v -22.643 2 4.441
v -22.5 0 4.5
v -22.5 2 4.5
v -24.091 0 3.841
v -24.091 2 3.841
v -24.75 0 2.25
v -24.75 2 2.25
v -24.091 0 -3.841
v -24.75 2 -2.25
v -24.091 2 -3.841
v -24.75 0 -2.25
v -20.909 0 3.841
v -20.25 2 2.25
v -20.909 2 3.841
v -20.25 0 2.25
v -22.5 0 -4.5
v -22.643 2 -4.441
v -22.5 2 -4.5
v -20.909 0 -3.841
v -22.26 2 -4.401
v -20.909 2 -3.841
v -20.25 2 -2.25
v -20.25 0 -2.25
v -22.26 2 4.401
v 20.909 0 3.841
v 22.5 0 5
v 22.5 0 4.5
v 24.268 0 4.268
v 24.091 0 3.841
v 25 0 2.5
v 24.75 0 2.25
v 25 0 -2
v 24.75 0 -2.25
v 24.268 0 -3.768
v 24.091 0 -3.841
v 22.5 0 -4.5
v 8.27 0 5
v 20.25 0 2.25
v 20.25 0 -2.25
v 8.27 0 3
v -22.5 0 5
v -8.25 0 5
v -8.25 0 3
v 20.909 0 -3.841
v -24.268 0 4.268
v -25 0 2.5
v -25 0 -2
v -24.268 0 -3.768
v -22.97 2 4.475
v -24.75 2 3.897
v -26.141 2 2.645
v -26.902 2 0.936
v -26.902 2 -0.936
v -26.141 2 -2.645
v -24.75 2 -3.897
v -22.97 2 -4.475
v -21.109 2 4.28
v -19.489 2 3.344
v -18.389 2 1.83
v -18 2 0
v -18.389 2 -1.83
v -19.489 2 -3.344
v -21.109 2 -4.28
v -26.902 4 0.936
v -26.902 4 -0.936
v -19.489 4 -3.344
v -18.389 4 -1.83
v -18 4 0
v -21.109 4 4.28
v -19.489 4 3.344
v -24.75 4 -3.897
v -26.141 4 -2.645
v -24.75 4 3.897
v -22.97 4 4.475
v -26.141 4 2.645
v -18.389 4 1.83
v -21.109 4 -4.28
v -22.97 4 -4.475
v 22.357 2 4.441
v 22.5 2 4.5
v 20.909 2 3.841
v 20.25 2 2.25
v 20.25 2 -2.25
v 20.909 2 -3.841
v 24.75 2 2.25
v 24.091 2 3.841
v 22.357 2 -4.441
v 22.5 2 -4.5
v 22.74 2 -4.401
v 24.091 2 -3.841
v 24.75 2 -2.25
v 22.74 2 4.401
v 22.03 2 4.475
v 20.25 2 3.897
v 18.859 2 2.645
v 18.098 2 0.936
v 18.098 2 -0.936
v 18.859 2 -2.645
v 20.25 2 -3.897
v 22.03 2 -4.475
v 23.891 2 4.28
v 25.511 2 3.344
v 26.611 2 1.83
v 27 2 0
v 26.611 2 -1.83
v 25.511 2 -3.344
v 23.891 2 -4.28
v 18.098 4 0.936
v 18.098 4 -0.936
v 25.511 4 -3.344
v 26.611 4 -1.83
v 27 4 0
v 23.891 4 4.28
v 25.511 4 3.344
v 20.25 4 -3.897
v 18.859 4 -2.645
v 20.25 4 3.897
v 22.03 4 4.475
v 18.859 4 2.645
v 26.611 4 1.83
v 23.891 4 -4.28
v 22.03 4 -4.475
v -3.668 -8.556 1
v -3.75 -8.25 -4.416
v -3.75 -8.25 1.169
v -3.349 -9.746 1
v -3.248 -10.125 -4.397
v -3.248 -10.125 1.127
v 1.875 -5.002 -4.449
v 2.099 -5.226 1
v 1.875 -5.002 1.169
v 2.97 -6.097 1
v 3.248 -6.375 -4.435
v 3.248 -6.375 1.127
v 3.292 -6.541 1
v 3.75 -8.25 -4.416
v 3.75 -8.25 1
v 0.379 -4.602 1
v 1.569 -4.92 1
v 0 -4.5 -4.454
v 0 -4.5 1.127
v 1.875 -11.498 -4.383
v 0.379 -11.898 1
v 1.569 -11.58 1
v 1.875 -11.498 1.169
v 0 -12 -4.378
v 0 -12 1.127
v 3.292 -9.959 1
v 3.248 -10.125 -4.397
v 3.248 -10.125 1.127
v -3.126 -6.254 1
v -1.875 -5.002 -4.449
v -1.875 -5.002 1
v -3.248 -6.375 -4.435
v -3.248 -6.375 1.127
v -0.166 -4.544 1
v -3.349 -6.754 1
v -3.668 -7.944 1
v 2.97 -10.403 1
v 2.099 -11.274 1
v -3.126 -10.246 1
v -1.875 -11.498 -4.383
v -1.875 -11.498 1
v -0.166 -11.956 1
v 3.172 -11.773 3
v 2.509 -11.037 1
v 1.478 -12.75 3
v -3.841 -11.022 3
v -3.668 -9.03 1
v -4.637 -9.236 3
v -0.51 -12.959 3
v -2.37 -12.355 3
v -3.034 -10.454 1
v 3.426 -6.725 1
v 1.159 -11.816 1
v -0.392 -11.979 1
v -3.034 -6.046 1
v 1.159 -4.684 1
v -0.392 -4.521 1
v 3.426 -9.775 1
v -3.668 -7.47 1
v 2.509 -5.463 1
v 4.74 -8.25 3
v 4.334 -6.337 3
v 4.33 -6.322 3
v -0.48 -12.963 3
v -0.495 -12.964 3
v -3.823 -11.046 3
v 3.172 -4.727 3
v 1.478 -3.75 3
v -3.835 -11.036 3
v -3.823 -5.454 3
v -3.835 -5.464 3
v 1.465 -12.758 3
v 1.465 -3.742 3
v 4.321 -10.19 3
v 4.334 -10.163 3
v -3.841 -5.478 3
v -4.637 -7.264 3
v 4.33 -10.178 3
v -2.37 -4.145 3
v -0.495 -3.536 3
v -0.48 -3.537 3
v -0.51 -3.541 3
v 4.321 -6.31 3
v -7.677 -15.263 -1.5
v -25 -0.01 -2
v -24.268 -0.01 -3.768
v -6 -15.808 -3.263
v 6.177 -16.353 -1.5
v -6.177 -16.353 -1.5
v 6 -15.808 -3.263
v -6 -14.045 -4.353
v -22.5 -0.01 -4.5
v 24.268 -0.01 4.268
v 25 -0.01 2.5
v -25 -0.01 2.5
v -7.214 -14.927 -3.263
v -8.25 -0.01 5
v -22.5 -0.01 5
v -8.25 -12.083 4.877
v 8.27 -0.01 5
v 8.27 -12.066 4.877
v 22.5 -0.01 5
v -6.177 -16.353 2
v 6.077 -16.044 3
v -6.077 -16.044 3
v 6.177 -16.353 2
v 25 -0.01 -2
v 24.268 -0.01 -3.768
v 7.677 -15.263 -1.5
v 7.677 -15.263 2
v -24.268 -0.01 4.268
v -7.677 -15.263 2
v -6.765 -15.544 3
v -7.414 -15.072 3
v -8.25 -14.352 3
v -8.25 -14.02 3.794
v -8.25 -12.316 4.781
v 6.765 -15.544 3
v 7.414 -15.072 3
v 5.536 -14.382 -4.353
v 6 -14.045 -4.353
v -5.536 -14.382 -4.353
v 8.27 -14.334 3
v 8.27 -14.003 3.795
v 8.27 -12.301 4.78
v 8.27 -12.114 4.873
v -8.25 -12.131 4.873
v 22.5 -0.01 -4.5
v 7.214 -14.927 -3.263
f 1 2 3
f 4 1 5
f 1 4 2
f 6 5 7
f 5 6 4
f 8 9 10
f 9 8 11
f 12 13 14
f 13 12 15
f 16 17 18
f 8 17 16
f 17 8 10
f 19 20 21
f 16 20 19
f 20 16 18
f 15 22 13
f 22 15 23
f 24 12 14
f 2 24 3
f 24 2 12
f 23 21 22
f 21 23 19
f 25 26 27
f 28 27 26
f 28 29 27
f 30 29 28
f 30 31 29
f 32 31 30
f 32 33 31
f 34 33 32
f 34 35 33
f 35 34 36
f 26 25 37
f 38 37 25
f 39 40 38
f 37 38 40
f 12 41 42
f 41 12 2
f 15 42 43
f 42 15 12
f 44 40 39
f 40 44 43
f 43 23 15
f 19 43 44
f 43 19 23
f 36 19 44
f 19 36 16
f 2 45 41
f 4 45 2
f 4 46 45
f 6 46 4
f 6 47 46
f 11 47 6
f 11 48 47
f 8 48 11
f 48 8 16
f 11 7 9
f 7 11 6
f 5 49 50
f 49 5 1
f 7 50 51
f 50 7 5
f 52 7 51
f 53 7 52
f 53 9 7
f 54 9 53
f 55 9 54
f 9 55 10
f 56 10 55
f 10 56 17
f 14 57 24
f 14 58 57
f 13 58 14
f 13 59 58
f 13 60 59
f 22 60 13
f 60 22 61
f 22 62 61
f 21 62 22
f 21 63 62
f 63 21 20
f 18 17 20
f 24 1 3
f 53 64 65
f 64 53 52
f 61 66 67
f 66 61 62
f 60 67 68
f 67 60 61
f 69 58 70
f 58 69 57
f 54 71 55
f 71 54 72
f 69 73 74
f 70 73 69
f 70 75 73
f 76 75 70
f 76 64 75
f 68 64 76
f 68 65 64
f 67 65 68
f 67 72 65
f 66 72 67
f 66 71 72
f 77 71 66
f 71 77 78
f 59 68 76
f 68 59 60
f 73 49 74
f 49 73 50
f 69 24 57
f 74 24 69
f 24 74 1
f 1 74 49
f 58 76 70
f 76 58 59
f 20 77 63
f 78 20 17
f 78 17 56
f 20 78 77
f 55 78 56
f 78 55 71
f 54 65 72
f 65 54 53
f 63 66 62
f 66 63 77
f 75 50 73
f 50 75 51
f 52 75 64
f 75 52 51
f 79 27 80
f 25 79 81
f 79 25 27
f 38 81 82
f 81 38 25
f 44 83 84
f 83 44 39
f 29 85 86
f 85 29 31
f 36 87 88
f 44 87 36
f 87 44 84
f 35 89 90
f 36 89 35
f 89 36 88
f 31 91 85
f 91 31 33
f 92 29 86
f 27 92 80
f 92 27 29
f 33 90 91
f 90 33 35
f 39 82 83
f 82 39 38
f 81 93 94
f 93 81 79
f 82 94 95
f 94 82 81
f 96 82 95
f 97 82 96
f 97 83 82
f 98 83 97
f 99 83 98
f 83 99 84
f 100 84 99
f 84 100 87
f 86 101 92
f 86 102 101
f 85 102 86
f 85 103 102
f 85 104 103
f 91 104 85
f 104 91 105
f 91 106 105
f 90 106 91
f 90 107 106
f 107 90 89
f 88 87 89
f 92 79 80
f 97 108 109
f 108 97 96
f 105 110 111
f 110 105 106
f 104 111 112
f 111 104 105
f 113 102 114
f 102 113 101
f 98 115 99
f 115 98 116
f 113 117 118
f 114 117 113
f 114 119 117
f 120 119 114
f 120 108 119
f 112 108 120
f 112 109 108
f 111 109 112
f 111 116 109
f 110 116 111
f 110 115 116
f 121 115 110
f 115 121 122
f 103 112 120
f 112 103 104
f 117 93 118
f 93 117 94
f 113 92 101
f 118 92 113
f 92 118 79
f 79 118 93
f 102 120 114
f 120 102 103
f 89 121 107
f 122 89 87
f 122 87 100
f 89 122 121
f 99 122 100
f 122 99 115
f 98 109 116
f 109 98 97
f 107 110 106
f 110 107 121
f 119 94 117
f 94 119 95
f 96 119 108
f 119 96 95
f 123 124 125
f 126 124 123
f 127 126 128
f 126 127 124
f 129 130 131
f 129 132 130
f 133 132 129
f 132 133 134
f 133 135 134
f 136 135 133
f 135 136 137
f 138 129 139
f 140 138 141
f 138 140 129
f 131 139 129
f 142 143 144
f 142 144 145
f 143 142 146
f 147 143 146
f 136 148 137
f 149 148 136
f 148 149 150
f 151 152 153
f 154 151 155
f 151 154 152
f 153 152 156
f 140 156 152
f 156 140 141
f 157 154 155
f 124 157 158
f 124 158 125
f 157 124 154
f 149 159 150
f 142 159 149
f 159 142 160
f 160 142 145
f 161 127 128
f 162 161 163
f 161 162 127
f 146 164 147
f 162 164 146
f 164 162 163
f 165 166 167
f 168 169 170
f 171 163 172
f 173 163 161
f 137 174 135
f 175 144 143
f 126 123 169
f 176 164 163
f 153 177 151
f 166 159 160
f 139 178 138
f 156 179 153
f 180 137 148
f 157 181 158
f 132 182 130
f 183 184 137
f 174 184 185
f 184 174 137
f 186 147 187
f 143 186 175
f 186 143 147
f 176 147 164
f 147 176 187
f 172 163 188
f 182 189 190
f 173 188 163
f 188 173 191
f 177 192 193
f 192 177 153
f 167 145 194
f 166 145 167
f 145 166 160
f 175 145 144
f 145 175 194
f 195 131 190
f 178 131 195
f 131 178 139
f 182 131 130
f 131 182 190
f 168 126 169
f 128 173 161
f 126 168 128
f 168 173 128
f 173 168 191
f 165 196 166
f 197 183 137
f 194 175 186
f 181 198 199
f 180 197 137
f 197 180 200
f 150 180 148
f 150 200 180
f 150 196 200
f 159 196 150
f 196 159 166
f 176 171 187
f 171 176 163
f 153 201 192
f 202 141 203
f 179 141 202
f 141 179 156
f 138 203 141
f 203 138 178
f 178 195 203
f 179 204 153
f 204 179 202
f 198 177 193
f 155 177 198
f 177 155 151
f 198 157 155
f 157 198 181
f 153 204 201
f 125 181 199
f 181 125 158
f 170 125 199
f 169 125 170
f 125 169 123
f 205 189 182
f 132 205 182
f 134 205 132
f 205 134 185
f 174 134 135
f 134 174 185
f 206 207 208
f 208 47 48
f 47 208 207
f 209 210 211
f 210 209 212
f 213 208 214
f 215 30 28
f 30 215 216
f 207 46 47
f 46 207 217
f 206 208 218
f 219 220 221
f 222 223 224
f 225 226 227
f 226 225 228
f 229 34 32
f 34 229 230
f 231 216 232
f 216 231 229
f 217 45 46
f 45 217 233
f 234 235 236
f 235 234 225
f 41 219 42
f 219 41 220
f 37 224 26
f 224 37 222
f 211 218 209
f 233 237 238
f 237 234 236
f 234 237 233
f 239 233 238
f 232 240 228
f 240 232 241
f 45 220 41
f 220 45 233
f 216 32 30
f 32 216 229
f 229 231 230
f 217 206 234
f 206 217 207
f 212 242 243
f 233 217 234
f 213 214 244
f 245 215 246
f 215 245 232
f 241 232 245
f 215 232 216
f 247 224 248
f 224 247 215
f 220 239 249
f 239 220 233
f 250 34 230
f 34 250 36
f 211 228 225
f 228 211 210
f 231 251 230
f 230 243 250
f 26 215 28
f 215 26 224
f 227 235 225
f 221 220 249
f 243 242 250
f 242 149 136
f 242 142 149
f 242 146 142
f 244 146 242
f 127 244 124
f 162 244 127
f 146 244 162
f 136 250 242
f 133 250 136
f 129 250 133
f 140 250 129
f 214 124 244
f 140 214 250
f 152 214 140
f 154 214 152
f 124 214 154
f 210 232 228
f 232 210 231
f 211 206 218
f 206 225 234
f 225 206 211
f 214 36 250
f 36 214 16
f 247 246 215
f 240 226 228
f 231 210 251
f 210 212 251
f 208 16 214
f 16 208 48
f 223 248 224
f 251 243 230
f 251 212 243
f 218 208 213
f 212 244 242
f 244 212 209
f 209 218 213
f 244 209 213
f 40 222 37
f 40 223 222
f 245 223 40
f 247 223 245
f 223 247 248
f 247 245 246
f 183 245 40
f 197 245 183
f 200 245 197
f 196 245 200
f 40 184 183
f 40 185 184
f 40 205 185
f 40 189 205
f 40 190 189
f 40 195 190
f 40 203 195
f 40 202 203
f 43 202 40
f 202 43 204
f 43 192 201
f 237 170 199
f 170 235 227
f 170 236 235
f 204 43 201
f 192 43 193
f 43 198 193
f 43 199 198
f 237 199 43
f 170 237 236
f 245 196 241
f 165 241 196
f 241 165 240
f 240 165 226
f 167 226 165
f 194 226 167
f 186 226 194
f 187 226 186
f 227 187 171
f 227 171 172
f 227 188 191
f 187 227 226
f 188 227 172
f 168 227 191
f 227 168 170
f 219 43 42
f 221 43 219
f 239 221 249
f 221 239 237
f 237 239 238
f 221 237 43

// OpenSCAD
// file: peg.scad
pegSlot = 5; // the small opening it slides into
pegD = 9;    // the large opening to put it into
pegH = 22;   // top of large opening to bottom of small opening

holeD = 3.75; // "screw" holes

holeSpacingX = 15;
holeSpacingY = 14.5; // yes, this is actually not a grid. go figure
pegSpacingX = 3 * holeSpacingX;
pegSpacingY = 4 * holeSpacingY;

module peg(t = 2, clearance = 2)
{
    D = pegD;
    d = 4.5;

    rotate([ -90, 0, 0 ])
    {
        hull()
        {
            translate([ 0, (D - d) / 2, 0 ]) cylinder(h = clearance, d = d);
            translate([ 0, -(D - d) / 2, 0 ]) cylinder(h = clearance, d = d);
        }
        translate([ 0, 0, clearance ]) cylinder(h = t, d = D);
    }
}

module pegs(n, t = 2, clearance = 2)
{
    pegSpacingX = 45;
    x0 = ((1 - n) * pegSpacingX) / 2;
    for (i = [0:(n - 1)])
    {
        translate([ x0 + i * pegSpacingX, 0, 0 ]) peg(t, clearance);
    }
}
// main file
include <peg.scad>;

// thick enough to block pivoting, but thin enough so it is enough to push the top endcap up to unblock it
pivotBlocker = (pegD - pegSlot) / 2;

od = 16.5;

pivotD = 7.5;
pivotH = 9;
pivotLip = 2; // extrusion at the edge is a bit wider then the rest

pivotOffset = 226;
height = (4 * pegSpacingY - pivotOffset) / 2 + pivotBlocker;

width = pegSpacingX + pegSlot;
rounding = 3;

endCap();
module endCap()
{
    pegs(2);
    difference()
    {
        hull()
        {
            rotate([ 90, 0, 0 ])
            {
                translate([ pegSlot / 2 - width / 2, pegSlot / 2 - pegD / 2, 0 ]) cylinder(h = .01, d = pegSlot);
                translate([ width / 2 - pegSlot / 2, pegSlot / 2 - pegD / 2, 0 ]) cylinder(h = .01, d = pegSlot);
                translate([ pegSlot / 2 - width / 2, height - pegSlot / 2, 0 ]) cylinder(h = .01, d = pegSlot);
                translate([ width / 2 - pegSlot / 2, height - pegSlot / 2, 0 ]) cylinder(h = .01, d = pegSlot);
            }
            translate([ rounding - od / 2, rounding - od, rounding - pegD / 2 ]) sphere(r = rounding);
            translate([ od / 2 - rounding, rounding - od, rounding - pegD / 2 ]) sphere(r = rounding);
            translate([ rounding - od / 2, rounding - od, height - rounding ]) sphere(r = rounding);
            translate([ od / 2 - rounding, rounding - od, height - rounding ]) sphere(r = rounding);
        }

        translate([ 0, -od / 2, height - pivotH - pivotBlocker ])
        {
            cylinder(h = pivotH, d = pivotD);
            translate([ 0, 0, pivotH - pivotLip ]) cylinder(h = pivotLip + .02, d1 = pivotD, d2 = pivotD + pivotLip);
        }
        translate([ -od / 2, -od - .01, height - pivotBlocker ]) cube(od + .02);
    }
}
